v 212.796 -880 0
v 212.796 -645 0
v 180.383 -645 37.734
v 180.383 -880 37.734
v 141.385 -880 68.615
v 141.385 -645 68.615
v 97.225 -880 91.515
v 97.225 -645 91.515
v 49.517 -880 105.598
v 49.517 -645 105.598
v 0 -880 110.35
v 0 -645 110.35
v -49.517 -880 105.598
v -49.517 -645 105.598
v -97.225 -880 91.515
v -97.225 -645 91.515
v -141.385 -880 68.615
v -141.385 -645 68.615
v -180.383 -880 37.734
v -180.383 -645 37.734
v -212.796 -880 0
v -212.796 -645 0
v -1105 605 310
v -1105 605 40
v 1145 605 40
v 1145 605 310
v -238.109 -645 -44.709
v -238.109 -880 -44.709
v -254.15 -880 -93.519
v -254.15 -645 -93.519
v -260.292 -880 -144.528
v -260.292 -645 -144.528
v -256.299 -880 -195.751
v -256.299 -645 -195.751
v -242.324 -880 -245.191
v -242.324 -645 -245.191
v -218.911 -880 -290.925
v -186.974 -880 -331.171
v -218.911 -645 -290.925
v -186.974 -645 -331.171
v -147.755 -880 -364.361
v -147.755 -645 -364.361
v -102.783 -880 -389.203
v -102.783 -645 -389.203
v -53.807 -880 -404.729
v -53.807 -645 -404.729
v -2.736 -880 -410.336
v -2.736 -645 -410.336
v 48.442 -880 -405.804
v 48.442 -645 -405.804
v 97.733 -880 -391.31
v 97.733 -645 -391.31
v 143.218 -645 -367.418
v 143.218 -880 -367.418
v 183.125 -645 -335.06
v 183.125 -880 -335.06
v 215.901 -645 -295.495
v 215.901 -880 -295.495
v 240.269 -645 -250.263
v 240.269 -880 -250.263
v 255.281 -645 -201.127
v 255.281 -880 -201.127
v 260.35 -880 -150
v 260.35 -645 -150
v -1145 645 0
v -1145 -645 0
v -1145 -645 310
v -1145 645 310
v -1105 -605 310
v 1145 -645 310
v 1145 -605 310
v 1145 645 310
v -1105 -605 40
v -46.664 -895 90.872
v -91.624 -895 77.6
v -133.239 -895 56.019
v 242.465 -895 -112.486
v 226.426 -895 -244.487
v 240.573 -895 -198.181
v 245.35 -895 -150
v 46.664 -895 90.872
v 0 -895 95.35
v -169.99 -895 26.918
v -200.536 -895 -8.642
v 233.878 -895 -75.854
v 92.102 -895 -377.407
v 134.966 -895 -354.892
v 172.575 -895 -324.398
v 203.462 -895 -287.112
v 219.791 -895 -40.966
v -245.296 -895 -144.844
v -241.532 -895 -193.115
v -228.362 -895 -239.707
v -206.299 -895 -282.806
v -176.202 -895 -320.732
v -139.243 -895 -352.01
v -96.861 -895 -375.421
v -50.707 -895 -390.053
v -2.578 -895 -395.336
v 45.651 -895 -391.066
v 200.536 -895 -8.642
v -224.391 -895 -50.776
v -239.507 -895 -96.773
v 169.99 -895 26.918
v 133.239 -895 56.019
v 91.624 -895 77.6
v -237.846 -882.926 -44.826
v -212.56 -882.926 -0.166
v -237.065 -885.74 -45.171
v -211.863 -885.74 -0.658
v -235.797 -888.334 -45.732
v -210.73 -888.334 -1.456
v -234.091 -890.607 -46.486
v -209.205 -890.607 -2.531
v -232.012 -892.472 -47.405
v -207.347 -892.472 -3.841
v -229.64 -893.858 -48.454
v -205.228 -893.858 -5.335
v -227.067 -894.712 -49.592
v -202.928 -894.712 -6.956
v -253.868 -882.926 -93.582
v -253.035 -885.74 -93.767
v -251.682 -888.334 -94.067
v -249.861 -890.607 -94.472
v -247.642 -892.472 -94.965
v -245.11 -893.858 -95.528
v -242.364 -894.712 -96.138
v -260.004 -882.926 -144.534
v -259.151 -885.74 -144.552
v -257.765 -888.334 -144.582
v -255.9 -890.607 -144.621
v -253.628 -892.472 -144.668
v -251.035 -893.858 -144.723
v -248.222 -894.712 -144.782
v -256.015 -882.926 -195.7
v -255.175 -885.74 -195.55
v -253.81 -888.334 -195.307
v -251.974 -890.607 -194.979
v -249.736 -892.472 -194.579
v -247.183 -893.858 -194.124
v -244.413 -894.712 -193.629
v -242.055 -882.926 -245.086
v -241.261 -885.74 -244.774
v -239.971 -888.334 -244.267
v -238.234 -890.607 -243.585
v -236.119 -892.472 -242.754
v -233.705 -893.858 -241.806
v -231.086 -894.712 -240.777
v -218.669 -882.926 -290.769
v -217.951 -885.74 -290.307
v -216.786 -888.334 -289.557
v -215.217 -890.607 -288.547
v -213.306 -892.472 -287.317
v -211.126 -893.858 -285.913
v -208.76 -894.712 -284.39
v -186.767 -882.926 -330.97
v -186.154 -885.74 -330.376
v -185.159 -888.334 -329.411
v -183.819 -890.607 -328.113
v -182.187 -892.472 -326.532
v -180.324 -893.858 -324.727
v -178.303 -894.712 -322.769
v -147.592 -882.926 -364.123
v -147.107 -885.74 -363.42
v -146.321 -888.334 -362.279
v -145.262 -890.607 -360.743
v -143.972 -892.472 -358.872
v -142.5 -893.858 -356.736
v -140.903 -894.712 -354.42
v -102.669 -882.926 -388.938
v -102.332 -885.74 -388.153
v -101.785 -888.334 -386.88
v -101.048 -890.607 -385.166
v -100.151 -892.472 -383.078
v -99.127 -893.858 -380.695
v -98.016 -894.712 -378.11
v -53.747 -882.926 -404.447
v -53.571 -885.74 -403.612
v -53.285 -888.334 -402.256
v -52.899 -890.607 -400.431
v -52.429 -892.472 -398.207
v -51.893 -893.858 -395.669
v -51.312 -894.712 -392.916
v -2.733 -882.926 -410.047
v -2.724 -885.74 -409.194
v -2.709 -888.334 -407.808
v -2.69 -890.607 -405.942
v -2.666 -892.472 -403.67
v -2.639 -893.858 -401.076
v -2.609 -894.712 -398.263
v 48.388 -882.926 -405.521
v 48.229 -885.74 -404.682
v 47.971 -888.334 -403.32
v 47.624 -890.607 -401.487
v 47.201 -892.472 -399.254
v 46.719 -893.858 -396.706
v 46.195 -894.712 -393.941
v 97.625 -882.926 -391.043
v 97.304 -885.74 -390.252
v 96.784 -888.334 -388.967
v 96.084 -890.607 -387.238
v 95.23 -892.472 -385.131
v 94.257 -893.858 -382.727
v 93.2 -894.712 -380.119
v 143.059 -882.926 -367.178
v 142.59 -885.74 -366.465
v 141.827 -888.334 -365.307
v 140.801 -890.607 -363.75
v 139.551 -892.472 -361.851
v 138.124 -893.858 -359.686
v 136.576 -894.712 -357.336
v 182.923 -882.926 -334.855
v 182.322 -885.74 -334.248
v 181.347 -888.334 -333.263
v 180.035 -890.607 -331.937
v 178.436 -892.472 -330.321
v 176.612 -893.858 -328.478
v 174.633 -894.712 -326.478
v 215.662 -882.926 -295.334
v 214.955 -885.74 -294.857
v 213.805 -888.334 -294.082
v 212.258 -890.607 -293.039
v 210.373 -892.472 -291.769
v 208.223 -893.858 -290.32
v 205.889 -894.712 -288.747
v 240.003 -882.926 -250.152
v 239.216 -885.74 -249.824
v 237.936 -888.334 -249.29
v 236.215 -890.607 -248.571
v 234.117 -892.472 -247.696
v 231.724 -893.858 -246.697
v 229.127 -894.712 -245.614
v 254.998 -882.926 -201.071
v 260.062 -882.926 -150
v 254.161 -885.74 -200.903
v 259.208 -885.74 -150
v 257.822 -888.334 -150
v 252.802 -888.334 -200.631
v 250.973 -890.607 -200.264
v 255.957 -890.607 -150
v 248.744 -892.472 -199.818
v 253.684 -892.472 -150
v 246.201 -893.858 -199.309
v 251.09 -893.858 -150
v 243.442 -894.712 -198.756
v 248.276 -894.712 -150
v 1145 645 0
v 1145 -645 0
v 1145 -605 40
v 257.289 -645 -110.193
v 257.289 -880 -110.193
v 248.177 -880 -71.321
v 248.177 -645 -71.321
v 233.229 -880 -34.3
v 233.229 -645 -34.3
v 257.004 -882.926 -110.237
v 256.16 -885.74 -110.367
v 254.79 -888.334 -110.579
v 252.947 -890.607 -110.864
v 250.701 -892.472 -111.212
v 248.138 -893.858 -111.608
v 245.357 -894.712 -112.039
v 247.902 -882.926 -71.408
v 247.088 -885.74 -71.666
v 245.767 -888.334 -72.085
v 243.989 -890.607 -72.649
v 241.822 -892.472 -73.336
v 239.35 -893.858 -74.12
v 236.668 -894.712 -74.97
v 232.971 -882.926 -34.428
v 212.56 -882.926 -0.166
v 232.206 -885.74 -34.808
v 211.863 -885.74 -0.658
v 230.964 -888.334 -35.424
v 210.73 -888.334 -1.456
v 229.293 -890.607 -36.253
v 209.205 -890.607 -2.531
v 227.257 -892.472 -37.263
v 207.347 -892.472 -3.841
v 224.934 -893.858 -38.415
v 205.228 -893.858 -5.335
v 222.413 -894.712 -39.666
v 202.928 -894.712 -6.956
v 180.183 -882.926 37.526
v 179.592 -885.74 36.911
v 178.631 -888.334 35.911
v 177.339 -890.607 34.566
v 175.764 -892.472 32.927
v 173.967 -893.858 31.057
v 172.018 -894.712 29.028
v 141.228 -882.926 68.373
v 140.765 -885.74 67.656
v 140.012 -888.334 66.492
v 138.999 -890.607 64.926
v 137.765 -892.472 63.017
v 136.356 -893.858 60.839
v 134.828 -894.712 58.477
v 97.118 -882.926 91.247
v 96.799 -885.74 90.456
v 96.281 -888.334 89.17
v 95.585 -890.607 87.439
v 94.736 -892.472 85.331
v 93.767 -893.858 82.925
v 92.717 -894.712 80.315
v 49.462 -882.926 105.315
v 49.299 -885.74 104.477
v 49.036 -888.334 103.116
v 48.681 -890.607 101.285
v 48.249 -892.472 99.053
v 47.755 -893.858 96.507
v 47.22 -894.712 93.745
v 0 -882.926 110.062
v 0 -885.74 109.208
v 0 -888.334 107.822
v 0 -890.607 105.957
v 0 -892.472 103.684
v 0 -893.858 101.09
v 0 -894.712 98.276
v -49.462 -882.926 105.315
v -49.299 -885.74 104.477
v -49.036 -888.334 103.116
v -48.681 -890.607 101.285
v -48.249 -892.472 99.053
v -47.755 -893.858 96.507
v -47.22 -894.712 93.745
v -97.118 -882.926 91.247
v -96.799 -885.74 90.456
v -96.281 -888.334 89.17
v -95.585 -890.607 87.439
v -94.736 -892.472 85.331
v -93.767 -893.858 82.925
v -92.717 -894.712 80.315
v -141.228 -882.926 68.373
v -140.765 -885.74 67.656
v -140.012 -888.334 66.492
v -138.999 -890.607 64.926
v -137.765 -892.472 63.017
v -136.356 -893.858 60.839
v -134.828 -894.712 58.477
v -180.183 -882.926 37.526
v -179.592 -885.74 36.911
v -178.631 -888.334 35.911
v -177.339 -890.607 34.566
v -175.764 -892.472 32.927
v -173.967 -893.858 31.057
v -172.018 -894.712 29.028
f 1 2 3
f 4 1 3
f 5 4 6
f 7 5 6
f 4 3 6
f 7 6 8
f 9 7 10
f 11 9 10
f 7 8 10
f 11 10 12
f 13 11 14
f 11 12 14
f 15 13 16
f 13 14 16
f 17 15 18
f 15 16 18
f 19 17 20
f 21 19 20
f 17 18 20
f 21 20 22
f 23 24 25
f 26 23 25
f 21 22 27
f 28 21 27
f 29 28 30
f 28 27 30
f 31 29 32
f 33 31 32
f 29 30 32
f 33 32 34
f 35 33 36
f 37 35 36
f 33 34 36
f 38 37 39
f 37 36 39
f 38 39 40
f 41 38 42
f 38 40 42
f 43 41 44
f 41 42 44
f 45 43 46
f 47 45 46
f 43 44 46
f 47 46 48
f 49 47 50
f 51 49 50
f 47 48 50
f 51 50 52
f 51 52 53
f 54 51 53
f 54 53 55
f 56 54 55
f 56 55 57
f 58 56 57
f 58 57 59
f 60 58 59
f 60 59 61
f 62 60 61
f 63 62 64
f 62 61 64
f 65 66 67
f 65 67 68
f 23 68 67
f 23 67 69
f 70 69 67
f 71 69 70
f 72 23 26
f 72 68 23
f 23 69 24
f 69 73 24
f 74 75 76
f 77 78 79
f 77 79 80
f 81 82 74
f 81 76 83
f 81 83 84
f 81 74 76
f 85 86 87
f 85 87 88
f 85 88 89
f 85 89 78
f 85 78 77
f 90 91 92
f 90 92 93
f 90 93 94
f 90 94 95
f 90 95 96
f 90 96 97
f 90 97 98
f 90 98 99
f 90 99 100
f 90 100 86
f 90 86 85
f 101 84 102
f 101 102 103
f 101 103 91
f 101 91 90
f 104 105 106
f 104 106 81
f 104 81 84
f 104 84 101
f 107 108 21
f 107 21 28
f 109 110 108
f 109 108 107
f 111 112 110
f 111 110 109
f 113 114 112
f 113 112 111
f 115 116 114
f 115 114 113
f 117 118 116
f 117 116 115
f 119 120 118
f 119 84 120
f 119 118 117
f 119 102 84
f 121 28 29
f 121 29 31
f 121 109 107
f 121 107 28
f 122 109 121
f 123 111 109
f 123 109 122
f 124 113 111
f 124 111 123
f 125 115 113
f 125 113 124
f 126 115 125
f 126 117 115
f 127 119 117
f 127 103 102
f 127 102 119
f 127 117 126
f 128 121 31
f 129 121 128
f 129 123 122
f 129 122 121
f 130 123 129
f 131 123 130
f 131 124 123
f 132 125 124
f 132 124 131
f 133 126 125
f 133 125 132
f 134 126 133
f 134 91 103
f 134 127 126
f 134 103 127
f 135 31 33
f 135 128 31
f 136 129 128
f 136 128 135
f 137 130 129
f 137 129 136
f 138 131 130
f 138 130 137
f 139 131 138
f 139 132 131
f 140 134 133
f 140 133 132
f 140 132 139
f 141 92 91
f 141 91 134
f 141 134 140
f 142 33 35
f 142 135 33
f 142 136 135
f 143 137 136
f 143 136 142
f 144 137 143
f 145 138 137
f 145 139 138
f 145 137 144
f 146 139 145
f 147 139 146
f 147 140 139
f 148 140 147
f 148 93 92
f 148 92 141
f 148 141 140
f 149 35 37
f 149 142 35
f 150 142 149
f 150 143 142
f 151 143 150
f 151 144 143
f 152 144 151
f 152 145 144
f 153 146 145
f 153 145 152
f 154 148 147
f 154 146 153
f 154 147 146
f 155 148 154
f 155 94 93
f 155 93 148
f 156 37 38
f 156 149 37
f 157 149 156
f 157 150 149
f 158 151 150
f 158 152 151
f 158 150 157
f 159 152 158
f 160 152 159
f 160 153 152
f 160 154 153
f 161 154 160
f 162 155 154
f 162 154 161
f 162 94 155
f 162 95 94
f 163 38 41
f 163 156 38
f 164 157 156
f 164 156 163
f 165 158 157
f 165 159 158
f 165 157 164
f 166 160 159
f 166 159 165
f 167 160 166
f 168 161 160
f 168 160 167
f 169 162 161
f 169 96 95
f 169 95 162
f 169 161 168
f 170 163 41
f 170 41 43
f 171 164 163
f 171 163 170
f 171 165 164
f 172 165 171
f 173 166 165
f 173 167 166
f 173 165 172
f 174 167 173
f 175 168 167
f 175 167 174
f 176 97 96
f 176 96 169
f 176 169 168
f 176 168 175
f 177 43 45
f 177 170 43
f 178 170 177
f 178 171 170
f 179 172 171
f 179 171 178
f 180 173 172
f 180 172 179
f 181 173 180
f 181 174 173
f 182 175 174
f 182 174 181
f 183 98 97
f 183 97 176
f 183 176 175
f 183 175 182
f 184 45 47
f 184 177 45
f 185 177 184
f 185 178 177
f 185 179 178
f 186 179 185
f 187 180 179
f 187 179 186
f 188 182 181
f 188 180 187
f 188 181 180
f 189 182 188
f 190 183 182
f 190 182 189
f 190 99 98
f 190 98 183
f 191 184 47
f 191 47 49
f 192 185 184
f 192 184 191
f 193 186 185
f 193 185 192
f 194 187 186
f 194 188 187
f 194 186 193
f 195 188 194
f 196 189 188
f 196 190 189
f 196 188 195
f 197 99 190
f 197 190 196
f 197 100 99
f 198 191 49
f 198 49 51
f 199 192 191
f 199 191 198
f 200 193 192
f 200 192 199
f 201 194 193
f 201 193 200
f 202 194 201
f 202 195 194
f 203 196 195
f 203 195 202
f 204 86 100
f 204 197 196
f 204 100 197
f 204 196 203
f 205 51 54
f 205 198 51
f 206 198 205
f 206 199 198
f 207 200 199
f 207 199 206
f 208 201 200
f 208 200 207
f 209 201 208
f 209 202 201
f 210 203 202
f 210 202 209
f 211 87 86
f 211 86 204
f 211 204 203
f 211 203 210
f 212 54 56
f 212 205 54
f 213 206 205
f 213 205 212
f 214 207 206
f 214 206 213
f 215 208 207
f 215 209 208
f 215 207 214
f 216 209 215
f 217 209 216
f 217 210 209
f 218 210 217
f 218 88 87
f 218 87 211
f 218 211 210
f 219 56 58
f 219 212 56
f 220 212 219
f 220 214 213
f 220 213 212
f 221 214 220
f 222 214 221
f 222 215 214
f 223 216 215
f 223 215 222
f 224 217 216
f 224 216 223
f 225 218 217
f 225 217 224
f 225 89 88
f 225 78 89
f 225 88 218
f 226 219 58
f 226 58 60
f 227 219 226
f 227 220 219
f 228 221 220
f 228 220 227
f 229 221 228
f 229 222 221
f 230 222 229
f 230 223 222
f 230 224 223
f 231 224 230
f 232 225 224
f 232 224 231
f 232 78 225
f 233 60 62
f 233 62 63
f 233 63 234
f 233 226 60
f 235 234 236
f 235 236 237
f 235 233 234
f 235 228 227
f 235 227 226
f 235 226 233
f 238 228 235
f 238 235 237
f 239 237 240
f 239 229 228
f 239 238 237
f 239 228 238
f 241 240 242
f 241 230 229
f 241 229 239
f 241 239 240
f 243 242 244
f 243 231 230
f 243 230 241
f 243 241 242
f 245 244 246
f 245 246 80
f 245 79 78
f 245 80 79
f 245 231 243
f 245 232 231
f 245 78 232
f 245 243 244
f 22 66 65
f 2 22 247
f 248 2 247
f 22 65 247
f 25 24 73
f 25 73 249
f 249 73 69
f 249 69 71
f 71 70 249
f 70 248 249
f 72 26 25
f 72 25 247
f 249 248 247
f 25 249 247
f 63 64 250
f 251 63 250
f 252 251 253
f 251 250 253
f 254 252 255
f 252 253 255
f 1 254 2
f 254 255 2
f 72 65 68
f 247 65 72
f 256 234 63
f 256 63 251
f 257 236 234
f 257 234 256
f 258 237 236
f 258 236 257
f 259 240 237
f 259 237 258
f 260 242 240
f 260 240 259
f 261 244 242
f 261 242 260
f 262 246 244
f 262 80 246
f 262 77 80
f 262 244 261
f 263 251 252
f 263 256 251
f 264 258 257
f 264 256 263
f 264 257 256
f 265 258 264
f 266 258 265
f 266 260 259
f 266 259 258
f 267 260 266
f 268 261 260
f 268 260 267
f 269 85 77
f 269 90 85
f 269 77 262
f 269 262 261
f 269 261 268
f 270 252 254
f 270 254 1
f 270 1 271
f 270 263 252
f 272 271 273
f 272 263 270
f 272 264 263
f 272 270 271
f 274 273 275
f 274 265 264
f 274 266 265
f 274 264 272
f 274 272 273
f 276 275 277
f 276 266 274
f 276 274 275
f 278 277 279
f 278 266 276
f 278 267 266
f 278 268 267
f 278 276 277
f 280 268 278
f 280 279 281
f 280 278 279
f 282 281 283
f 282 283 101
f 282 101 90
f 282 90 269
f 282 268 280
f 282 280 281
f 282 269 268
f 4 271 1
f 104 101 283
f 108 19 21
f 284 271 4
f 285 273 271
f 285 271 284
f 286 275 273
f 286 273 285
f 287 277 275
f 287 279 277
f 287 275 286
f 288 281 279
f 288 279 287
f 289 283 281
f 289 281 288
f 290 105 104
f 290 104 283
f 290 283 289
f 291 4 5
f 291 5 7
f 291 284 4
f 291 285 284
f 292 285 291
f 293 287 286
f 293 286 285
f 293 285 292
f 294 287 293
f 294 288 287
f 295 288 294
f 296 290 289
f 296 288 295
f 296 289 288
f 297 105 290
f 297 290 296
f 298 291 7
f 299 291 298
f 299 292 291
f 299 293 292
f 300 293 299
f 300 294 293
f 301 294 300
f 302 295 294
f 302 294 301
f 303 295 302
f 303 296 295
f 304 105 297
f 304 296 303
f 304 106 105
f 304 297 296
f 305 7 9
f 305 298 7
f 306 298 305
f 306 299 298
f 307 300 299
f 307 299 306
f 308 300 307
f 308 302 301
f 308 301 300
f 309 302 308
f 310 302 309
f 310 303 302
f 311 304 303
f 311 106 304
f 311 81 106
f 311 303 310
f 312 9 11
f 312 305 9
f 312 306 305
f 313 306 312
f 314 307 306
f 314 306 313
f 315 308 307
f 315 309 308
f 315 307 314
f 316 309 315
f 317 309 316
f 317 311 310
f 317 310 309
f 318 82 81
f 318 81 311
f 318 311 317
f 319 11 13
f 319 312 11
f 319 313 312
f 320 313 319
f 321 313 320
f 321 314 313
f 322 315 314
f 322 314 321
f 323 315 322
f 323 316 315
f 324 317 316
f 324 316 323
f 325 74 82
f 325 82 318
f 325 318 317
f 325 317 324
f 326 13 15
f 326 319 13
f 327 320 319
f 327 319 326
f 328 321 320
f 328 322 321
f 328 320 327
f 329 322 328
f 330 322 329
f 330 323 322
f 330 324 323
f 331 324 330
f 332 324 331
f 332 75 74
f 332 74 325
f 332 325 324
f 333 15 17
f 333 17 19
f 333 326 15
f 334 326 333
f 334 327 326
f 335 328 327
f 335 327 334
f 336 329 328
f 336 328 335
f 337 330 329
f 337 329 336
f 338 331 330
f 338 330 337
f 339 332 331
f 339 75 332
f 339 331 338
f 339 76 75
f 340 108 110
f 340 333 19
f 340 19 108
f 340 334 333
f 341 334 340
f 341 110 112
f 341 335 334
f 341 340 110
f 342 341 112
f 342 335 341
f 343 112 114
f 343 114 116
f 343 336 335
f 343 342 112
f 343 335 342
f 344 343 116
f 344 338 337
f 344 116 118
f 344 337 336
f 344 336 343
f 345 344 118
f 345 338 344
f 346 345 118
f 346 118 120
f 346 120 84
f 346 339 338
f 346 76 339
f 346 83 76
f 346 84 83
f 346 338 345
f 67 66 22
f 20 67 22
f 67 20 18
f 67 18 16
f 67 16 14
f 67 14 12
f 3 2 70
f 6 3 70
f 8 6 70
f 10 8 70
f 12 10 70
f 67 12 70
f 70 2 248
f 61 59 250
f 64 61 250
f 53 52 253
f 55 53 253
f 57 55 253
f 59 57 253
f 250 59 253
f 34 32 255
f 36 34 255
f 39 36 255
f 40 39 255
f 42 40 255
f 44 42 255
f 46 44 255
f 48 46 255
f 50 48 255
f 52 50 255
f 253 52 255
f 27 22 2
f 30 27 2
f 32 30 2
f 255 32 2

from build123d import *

# Parameters (mm, degrees)
F0_W     = 2290
F0_H     = 1290
F1_DEPTH = 310
F2_T     = -40
F4_DEPTH = 250
F5_R     = 15


with BuildPart() as f1:
    # F0 (on Top) → F1 (new body)
    with BuildSketch(Plane.XY):
        Rectangle(F0_W, F0_H)
    extrude(amount=F1_DEPTH)

    # F2
    f2_openings = [f1.faces().sort_by_distance(p)[0] for p in [
        (0, 0, 310),
        (1145, 0, 155),
    ]]
    offset(amount=F2_T, openings=f2_openings)

    # F3 (on face) → F4 (join)
    with BuildSketch(Plane.XZ.offset(645)):
        with BuildLine():
            Line((-212.795964, 0), (212.795964, 0))
            ThreePointArc((212.795964, 0), (0, 110.35), (-212.795964, 0))
        make_face()
        with BuildLine():
            ThreePointArc((-212.795964, 0), (-78.678756, -398.176904), (260.35, -150))
            ThreePointArc((260.35, -150), (248.176904, -71.321244), (212.795964, 0))
            Line((212.795964, 0), (-212.795964, 0))
        make_face()
    extrude(amount=F4_DEPTH)

    # F5
    f5_edges = [f1.edges().sort_by_distance(p)[0] for p in [
        (-260.35, -895, -150),
    ]]
    fillet(f5_edges, radius=F5_R)


solid = f1.part
